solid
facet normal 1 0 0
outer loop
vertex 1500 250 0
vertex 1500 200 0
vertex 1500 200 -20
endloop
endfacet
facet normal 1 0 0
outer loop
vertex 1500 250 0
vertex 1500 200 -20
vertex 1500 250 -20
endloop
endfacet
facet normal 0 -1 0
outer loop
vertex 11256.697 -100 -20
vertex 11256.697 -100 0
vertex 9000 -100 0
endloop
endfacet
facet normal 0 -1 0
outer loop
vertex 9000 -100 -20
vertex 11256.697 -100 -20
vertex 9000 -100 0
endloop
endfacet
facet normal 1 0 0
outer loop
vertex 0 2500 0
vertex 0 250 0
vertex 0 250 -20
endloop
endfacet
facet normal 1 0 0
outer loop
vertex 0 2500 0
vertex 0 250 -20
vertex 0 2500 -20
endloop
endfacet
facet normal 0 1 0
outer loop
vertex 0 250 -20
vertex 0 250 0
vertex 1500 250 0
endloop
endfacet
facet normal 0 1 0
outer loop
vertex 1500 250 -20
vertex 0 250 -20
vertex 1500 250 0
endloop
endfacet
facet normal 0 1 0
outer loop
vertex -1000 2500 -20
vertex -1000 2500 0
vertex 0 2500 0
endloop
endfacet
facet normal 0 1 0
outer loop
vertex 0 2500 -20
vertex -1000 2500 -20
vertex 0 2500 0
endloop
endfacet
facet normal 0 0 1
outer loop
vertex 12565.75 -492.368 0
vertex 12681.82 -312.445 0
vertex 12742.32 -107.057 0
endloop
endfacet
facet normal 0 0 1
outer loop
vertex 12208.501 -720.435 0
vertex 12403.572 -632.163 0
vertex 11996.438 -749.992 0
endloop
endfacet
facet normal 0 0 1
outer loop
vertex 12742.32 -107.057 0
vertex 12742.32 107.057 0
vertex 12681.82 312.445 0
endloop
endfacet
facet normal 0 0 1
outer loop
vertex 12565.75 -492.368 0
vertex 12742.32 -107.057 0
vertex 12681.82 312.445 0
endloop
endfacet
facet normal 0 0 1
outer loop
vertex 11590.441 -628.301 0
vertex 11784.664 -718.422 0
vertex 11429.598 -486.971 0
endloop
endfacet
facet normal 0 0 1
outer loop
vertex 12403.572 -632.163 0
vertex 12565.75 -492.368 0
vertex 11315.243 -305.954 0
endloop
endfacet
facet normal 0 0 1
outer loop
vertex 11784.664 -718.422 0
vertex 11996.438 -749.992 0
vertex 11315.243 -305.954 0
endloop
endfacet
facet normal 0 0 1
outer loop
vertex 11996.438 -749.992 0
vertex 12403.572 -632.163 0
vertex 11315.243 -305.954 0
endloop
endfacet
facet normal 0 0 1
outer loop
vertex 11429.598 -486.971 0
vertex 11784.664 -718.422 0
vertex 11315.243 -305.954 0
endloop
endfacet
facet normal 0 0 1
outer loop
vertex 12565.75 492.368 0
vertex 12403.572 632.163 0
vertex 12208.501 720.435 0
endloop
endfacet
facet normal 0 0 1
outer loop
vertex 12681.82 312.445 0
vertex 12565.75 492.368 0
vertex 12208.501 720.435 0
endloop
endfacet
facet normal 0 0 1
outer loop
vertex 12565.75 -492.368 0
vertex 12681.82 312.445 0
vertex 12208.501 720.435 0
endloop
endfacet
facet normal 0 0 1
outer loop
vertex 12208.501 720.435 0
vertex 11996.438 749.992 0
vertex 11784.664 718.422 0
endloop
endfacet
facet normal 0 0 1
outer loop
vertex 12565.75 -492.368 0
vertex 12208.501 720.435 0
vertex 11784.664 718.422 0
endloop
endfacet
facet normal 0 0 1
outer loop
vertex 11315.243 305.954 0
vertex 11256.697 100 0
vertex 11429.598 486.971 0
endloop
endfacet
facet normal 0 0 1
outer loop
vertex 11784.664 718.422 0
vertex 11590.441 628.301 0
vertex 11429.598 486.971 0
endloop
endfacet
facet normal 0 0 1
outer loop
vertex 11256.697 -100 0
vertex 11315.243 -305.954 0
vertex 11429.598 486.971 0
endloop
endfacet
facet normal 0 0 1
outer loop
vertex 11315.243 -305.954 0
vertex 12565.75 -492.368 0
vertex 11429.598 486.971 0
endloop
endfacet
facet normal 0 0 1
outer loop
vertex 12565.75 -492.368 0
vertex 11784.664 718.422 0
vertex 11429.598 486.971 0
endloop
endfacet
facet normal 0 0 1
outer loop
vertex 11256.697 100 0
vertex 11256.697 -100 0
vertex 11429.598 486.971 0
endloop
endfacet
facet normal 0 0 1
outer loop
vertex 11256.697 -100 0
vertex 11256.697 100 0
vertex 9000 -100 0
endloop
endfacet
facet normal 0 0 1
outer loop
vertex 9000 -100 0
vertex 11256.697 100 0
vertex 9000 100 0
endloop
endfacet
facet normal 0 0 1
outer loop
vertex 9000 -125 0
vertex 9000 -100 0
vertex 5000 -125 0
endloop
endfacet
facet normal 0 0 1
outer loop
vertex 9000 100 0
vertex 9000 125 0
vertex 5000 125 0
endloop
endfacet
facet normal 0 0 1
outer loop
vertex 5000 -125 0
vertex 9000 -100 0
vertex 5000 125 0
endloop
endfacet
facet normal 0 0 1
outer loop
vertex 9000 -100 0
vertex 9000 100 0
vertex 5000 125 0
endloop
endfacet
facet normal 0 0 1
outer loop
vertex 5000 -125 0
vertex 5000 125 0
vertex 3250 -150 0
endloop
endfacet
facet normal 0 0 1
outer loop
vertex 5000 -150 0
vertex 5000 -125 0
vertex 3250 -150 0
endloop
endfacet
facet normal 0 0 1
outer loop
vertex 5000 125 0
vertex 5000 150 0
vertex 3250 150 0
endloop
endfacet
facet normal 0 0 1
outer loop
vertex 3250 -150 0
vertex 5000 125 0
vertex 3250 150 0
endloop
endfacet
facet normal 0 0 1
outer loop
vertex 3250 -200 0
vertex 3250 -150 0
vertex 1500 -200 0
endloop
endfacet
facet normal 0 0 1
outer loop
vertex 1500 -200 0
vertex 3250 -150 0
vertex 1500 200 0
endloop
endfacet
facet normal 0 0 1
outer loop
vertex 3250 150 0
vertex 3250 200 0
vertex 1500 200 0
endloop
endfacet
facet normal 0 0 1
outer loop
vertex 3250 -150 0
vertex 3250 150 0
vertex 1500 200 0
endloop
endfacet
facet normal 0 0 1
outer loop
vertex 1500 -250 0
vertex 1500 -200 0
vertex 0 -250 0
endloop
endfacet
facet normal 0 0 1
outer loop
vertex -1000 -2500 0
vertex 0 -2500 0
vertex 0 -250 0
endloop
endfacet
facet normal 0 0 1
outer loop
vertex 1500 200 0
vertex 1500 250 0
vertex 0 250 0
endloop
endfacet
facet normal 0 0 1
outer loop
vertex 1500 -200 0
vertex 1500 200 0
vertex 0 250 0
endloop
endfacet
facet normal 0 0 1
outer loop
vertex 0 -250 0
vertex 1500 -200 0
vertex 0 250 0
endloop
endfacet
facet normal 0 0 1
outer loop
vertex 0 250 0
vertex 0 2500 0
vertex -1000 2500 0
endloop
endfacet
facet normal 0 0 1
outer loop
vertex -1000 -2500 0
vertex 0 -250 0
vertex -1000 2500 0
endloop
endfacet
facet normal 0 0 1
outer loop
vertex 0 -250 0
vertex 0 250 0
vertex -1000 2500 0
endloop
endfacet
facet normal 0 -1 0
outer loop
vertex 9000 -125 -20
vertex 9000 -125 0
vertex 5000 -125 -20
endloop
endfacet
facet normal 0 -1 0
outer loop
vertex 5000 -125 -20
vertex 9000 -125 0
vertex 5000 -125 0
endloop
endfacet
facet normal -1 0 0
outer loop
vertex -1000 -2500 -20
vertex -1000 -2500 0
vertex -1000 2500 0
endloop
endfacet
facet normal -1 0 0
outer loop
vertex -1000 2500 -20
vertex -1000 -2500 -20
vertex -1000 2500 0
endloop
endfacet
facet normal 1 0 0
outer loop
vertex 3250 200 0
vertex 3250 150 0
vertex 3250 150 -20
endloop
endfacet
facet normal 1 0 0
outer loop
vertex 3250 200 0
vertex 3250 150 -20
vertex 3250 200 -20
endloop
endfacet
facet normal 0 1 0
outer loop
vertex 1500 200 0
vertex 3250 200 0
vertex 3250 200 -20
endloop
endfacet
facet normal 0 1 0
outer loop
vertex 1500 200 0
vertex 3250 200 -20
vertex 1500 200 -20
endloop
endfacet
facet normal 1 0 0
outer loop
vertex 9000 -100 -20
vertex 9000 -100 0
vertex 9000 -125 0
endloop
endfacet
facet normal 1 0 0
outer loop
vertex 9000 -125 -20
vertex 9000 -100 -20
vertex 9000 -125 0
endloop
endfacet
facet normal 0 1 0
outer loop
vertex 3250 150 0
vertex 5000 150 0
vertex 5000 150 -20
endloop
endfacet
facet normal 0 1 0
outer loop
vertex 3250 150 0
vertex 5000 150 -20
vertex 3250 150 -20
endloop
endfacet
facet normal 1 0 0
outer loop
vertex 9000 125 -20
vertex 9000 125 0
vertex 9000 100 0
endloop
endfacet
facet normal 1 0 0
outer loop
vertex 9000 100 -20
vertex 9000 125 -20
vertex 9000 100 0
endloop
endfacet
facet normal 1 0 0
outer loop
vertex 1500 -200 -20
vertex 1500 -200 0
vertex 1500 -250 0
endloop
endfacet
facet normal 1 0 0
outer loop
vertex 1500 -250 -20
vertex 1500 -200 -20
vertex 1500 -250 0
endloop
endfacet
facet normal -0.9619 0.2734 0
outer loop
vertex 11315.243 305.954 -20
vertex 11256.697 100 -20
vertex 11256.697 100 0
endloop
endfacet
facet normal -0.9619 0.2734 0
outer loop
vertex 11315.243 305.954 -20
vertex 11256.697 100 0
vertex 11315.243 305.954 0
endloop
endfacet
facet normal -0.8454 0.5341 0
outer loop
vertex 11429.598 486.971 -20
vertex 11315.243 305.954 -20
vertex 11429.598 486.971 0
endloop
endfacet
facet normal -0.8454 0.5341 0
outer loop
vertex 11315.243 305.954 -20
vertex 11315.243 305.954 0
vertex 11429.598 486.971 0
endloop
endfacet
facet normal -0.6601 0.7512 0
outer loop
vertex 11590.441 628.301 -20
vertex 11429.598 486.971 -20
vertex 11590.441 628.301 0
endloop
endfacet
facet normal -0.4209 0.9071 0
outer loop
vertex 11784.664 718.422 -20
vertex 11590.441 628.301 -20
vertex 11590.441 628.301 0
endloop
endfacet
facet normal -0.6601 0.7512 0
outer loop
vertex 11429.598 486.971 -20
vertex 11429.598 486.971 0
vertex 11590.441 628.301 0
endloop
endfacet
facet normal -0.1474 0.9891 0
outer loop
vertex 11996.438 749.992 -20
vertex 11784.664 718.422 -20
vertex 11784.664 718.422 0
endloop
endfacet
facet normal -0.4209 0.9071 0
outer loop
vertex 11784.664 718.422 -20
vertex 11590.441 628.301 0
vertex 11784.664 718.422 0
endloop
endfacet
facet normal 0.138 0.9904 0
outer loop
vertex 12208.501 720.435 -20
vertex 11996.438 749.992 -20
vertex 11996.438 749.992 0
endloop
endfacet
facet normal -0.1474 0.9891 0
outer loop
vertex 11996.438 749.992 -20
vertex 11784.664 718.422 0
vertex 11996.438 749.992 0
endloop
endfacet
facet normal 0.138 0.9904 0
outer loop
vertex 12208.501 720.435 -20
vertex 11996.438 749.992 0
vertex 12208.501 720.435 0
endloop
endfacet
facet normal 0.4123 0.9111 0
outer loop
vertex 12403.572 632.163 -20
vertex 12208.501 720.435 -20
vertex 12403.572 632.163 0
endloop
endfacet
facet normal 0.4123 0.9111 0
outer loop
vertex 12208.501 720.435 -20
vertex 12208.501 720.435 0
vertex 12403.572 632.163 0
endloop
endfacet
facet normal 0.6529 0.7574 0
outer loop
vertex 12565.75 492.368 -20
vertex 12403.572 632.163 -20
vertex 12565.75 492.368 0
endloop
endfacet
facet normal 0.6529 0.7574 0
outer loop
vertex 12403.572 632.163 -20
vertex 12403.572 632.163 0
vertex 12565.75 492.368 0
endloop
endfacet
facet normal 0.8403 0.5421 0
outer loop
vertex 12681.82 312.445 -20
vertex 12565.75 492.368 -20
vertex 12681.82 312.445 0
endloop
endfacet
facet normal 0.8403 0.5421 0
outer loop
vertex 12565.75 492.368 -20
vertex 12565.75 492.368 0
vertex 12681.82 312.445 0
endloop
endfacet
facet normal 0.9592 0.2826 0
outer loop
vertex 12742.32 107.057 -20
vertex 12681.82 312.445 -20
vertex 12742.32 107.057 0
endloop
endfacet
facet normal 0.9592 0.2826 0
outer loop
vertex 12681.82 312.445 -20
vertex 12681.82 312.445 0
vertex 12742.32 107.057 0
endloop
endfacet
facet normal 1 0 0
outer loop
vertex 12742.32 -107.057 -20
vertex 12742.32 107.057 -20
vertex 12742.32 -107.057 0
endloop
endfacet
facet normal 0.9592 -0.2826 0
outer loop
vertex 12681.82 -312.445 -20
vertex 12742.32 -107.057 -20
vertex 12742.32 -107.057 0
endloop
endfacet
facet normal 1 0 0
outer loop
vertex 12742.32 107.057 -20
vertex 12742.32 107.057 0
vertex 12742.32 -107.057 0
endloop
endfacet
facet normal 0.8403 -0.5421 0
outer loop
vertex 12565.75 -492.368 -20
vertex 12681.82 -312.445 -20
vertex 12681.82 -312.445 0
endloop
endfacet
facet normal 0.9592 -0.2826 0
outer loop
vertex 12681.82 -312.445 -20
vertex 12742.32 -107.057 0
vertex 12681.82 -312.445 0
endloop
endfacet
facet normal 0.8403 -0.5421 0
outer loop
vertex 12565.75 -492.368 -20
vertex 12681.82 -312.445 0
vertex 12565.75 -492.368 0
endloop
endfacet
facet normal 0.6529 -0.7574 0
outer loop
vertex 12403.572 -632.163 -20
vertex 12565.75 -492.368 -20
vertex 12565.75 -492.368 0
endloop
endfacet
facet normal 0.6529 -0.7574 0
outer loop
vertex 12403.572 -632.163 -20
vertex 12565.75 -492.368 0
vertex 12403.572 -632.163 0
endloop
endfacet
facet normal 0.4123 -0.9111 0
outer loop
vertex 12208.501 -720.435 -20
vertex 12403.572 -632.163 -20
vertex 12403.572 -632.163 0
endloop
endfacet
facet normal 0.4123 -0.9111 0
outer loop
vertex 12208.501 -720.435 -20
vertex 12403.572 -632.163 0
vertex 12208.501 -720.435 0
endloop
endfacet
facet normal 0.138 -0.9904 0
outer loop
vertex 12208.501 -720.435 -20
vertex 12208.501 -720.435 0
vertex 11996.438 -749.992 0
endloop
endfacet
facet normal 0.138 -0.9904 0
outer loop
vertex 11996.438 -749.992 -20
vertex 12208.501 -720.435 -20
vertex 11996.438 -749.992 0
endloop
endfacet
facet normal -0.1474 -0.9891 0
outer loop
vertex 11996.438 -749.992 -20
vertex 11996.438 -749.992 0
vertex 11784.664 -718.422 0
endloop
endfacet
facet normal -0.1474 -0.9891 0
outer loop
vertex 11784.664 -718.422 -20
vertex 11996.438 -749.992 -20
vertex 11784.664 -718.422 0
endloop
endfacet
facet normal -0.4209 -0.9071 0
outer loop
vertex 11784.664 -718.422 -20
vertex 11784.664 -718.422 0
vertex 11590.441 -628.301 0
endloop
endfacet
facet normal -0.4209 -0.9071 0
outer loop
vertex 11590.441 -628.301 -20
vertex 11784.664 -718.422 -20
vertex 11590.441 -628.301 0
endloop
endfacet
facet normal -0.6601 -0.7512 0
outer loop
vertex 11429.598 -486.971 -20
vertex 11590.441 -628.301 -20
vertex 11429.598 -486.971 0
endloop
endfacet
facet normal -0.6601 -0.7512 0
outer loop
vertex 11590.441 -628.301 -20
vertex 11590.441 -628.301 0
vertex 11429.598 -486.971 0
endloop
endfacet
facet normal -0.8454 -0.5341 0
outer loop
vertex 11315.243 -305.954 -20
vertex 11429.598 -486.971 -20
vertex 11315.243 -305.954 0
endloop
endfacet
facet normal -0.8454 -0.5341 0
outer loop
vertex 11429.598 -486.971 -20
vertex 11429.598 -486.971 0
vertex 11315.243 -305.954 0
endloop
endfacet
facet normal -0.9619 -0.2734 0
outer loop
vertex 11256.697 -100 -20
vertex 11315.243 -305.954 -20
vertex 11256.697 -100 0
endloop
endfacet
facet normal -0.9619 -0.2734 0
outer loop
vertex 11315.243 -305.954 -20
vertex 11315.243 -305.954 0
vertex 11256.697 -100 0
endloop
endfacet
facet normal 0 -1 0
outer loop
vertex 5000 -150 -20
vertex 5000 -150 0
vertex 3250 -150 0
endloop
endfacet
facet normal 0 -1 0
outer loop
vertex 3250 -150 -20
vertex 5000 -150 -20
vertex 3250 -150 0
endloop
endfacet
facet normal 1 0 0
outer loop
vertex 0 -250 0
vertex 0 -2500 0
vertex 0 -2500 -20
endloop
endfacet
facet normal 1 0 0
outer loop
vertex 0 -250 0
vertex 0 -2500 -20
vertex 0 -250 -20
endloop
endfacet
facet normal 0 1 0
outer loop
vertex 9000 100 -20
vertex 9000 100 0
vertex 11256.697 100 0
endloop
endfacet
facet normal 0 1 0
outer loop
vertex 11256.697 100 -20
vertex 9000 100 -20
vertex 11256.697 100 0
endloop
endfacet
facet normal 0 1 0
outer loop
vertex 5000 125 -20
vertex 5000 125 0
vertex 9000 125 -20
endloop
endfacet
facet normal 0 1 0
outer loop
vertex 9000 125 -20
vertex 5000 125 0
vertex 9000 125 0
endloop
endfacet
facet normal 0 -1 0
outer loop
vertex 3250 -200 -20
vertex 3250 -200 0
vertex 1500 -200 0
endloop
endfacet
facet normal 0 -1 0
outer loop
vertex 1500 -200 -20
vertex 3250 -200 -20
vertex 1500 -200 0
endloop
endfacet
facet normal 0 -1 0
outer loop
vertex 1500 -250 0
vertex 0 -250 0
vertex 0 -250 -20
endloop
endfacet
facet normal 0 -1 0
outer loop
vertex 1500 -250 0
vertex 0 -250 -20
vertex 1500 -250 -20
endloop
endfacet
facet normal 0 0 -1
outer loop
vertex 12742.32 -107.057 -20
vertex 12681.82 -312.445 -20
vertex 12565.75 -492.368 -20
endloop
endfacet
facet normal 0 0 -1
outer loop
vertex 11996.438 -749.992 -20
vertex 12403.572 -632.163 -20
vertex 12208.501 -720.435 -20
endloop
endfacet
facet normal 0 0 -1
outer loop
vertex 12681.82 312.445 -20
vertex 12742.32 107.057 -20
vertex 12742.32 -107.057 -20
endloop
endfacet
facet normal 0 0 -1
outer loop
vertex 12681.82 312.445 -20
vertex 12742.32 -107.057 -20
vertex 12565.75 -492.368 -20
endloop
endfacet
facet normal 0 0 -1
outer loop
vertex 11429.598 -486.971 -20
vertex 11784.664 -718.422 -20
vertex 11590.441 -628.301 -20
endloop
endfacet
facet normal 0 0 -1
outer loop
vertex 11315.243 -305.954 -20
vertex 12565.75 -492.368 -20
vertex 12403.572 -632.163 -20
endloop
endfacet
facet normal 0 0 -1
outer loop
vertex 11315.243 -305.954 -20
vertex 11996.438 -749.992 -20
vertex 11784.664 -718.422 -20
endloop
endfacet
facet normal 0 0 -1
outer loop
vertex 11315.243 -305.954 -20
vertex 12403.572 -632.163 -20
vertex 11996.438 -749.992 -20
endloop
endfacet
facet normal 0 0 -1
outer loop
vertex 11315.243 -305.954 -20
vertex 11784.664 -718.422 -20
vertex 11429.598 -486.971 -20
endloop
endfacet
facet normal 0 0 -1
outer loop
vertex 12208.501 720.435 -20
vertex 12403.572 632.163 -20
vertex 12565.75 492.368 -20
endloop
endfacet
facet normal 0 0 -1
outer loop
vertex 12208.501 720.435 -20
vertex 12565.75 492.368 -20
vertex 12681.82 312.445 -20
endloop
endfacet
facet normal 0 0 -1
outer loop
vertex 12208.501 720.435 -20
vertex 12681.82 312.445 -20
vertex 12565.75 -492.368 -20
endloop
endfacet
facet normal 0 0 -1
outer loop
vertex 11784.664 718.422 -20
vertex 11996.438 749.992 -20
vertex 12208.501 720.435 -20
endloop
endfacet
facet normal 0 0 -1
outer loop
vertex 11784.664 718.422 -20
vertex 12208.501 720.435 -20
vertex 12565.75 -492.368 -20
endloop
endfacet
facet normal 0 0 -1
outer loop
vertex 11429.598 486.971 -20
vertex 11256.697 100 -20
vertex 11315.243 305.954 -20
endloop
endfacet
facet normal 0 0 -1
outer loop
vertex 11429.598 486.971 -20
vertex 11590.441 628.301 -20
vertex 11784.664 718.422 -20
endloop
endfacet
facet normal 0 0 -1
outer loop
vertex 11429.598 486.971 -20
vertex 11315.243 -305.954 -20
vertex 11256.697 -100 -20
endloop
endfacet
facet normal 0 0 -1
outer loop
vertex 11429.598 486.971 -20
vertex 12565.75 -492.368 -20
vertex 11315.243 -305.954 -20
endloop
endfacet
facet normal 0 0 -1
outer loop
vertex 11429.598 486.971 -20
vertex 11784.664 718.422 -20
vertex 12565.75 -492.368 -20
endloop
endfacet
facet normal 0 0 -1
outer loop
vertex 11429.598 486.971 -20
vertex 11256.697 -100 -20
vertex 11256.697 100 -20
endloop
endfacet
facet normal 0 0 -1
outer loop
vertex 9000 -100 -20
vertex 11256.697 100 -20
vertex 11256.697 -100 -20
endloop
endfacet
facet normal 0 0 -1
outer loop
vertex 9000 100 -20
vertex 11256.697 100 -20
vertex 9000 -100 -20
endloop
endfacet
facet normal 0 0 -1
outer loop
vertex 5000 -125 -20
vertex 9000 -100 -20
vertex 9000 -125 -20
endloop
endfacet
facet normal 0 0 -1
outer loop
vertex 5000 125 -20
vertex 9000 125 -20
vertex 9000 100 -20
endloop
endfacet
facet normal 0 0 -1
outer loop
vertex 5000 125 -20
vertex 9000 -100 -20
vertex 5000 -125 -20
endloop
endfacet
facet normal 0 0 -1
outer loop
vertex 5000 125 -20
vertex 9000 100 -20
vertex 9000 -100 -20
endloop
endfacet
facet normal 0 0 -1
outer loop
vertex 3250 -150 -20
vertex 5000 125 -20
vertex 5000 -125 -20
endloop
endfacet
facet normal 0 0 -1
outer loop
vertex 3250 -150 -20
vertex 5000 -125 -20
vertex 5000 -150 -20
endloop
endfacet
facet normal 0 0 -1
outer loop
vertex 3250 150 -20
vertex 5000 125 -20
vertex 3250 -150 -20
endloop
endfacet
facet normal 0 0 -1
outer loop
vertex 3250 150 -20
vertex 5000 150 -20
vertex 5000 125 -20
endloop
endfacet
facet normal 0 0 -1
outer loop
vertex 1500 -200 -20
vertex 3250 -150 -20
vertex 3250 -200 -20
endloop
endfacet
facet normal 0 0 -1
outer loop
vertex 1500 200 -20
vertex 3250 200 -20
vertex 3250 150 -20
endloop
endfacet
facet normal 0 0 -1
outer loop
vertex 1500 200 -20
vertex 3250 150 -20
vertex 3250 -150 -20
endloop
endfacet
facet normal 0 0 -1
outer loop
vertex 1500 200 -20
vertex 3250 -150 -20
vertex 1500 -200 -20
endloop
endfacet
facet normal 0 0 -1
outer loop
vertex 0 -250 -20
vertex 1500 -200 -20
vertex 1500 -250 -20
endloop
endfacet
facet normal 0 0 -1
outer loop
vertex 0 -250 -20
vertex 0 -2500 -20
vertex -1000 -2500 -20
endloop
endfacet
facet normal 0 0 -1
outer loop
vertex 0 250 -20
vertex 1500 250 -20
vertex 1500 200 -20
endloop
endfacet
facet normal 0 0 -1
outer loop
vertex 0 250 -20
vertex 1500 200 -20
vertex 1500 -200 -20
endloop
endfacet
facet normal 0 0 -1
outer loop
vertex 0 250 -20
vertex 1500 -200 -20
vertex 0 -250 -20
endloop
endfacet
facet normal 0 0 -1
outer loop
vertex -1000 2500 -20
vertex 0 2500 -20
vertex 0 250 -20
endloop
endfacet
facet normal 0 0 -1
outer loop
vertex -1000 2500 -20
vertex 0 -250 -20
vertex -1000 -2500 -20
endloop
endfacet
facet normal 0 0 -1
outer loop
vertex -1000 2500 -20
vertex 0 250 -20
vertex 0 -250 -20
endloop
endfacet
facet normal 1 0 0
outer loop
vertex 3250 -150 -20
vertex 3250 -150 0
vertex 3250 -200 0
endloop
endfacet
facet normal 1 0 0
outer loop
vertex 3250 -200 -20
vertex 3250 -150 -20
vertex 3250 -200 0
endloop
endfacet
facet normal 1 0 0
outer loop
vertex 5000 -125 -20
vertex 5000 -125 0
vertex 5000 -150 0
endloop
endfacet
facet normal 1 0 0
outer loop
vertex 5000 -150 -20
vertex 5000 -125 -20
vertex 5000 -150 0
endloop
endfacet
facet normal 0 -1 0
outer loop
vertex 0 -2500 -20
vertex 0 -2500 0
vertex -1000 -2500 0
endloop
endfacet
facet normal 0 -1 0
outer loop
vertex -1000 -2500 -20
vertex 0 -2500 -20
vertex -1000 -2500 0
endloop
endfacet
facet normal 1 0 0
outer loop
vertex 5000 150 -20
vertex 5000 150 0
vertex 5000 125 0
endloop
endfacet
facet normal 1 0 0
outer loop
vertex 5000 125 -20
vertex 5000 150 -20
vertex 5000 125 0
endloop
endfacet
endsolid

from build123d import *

# Parameters (mm, degrees)
BOSS_EXTRUDE1_DEPTH = 20
SKETCH2_W           = 1000
SKETCH2_H           = 2250
CUT_EXTRUDE1_DEPTH  = 12993.801853334
CUT_EXTRUDE4_DEPTH  = 12993.801853334


with BuildPart() as part:
    # Sketch1 → Boss-Extrude1 (new body)
    with BuildSketch(Plane.XY):
        with BuildLine():
            Line((1000, 250), (5000, 250))
            Line((5000, 250), (5000, 125))
            Line((5000, 125), (9000, 125))
            Line((9000, 125), (9000, 100))
            Line((9000, 100), (11256.696562634, 100))
            ThreePointArc((11256.696562634, 100), (12750, 0), (11256.696562634, -100))
            Line((11256.696562634, -100), (9000, -100))
            Line((9000, -100), (9000, -125))
            Line((9000, -125), (5000, -125))
            Line((5000, -125), (5000, -250))
            Line((5000, -250), (1000, -250))
            Line((1000, -250), (1000, -2500))
            Line((1000, -2500), (-1000, -2500))
            Line((-1000, -2500), (-1000, 2500))
            Line((-1000, 2500), (1000, 2500))
            Line((1000, 2500), (1000, 250))
        make_face()
    extrude(amount=-BOSS_EXTRUDE1_DEPTH)

    # Sketch2 → Cut-Extrude1 (cut, through all)
    with BuildSketch(Plane.XY):
        with Locations((500, 1375)):
            Rectangle(SKETCH2_W, SKETCH2_H)
        with Locations((500, -1375)):
            Rectangle(SKETCH2_W, SKETCH2_H)
    extrude(amount=-CUT_EXTRUDE1_DEPTH, mode=Mode.SUBTRACT)

    # Sketch3 → Cut-Extrude4 (cut, through all)
    with BuildSketch(Plane.XY):
        Polygon((1500, -250), (3250, -250), (5000, -250), (5000, -150), (3250, -150), (3250, -200), (1500, -200), align=None)
    cut_extrude4 = extrude(amount=-CUT_EXTRUDE4_DEPTH, mode=Mode.SUBTRACT)

    # Mirror1: Cut-Extrude4 across plane
    add(cut_extrude4.mirror(Plane.ZX), mode=Mode.SUBTRACT)


solid = part.part
